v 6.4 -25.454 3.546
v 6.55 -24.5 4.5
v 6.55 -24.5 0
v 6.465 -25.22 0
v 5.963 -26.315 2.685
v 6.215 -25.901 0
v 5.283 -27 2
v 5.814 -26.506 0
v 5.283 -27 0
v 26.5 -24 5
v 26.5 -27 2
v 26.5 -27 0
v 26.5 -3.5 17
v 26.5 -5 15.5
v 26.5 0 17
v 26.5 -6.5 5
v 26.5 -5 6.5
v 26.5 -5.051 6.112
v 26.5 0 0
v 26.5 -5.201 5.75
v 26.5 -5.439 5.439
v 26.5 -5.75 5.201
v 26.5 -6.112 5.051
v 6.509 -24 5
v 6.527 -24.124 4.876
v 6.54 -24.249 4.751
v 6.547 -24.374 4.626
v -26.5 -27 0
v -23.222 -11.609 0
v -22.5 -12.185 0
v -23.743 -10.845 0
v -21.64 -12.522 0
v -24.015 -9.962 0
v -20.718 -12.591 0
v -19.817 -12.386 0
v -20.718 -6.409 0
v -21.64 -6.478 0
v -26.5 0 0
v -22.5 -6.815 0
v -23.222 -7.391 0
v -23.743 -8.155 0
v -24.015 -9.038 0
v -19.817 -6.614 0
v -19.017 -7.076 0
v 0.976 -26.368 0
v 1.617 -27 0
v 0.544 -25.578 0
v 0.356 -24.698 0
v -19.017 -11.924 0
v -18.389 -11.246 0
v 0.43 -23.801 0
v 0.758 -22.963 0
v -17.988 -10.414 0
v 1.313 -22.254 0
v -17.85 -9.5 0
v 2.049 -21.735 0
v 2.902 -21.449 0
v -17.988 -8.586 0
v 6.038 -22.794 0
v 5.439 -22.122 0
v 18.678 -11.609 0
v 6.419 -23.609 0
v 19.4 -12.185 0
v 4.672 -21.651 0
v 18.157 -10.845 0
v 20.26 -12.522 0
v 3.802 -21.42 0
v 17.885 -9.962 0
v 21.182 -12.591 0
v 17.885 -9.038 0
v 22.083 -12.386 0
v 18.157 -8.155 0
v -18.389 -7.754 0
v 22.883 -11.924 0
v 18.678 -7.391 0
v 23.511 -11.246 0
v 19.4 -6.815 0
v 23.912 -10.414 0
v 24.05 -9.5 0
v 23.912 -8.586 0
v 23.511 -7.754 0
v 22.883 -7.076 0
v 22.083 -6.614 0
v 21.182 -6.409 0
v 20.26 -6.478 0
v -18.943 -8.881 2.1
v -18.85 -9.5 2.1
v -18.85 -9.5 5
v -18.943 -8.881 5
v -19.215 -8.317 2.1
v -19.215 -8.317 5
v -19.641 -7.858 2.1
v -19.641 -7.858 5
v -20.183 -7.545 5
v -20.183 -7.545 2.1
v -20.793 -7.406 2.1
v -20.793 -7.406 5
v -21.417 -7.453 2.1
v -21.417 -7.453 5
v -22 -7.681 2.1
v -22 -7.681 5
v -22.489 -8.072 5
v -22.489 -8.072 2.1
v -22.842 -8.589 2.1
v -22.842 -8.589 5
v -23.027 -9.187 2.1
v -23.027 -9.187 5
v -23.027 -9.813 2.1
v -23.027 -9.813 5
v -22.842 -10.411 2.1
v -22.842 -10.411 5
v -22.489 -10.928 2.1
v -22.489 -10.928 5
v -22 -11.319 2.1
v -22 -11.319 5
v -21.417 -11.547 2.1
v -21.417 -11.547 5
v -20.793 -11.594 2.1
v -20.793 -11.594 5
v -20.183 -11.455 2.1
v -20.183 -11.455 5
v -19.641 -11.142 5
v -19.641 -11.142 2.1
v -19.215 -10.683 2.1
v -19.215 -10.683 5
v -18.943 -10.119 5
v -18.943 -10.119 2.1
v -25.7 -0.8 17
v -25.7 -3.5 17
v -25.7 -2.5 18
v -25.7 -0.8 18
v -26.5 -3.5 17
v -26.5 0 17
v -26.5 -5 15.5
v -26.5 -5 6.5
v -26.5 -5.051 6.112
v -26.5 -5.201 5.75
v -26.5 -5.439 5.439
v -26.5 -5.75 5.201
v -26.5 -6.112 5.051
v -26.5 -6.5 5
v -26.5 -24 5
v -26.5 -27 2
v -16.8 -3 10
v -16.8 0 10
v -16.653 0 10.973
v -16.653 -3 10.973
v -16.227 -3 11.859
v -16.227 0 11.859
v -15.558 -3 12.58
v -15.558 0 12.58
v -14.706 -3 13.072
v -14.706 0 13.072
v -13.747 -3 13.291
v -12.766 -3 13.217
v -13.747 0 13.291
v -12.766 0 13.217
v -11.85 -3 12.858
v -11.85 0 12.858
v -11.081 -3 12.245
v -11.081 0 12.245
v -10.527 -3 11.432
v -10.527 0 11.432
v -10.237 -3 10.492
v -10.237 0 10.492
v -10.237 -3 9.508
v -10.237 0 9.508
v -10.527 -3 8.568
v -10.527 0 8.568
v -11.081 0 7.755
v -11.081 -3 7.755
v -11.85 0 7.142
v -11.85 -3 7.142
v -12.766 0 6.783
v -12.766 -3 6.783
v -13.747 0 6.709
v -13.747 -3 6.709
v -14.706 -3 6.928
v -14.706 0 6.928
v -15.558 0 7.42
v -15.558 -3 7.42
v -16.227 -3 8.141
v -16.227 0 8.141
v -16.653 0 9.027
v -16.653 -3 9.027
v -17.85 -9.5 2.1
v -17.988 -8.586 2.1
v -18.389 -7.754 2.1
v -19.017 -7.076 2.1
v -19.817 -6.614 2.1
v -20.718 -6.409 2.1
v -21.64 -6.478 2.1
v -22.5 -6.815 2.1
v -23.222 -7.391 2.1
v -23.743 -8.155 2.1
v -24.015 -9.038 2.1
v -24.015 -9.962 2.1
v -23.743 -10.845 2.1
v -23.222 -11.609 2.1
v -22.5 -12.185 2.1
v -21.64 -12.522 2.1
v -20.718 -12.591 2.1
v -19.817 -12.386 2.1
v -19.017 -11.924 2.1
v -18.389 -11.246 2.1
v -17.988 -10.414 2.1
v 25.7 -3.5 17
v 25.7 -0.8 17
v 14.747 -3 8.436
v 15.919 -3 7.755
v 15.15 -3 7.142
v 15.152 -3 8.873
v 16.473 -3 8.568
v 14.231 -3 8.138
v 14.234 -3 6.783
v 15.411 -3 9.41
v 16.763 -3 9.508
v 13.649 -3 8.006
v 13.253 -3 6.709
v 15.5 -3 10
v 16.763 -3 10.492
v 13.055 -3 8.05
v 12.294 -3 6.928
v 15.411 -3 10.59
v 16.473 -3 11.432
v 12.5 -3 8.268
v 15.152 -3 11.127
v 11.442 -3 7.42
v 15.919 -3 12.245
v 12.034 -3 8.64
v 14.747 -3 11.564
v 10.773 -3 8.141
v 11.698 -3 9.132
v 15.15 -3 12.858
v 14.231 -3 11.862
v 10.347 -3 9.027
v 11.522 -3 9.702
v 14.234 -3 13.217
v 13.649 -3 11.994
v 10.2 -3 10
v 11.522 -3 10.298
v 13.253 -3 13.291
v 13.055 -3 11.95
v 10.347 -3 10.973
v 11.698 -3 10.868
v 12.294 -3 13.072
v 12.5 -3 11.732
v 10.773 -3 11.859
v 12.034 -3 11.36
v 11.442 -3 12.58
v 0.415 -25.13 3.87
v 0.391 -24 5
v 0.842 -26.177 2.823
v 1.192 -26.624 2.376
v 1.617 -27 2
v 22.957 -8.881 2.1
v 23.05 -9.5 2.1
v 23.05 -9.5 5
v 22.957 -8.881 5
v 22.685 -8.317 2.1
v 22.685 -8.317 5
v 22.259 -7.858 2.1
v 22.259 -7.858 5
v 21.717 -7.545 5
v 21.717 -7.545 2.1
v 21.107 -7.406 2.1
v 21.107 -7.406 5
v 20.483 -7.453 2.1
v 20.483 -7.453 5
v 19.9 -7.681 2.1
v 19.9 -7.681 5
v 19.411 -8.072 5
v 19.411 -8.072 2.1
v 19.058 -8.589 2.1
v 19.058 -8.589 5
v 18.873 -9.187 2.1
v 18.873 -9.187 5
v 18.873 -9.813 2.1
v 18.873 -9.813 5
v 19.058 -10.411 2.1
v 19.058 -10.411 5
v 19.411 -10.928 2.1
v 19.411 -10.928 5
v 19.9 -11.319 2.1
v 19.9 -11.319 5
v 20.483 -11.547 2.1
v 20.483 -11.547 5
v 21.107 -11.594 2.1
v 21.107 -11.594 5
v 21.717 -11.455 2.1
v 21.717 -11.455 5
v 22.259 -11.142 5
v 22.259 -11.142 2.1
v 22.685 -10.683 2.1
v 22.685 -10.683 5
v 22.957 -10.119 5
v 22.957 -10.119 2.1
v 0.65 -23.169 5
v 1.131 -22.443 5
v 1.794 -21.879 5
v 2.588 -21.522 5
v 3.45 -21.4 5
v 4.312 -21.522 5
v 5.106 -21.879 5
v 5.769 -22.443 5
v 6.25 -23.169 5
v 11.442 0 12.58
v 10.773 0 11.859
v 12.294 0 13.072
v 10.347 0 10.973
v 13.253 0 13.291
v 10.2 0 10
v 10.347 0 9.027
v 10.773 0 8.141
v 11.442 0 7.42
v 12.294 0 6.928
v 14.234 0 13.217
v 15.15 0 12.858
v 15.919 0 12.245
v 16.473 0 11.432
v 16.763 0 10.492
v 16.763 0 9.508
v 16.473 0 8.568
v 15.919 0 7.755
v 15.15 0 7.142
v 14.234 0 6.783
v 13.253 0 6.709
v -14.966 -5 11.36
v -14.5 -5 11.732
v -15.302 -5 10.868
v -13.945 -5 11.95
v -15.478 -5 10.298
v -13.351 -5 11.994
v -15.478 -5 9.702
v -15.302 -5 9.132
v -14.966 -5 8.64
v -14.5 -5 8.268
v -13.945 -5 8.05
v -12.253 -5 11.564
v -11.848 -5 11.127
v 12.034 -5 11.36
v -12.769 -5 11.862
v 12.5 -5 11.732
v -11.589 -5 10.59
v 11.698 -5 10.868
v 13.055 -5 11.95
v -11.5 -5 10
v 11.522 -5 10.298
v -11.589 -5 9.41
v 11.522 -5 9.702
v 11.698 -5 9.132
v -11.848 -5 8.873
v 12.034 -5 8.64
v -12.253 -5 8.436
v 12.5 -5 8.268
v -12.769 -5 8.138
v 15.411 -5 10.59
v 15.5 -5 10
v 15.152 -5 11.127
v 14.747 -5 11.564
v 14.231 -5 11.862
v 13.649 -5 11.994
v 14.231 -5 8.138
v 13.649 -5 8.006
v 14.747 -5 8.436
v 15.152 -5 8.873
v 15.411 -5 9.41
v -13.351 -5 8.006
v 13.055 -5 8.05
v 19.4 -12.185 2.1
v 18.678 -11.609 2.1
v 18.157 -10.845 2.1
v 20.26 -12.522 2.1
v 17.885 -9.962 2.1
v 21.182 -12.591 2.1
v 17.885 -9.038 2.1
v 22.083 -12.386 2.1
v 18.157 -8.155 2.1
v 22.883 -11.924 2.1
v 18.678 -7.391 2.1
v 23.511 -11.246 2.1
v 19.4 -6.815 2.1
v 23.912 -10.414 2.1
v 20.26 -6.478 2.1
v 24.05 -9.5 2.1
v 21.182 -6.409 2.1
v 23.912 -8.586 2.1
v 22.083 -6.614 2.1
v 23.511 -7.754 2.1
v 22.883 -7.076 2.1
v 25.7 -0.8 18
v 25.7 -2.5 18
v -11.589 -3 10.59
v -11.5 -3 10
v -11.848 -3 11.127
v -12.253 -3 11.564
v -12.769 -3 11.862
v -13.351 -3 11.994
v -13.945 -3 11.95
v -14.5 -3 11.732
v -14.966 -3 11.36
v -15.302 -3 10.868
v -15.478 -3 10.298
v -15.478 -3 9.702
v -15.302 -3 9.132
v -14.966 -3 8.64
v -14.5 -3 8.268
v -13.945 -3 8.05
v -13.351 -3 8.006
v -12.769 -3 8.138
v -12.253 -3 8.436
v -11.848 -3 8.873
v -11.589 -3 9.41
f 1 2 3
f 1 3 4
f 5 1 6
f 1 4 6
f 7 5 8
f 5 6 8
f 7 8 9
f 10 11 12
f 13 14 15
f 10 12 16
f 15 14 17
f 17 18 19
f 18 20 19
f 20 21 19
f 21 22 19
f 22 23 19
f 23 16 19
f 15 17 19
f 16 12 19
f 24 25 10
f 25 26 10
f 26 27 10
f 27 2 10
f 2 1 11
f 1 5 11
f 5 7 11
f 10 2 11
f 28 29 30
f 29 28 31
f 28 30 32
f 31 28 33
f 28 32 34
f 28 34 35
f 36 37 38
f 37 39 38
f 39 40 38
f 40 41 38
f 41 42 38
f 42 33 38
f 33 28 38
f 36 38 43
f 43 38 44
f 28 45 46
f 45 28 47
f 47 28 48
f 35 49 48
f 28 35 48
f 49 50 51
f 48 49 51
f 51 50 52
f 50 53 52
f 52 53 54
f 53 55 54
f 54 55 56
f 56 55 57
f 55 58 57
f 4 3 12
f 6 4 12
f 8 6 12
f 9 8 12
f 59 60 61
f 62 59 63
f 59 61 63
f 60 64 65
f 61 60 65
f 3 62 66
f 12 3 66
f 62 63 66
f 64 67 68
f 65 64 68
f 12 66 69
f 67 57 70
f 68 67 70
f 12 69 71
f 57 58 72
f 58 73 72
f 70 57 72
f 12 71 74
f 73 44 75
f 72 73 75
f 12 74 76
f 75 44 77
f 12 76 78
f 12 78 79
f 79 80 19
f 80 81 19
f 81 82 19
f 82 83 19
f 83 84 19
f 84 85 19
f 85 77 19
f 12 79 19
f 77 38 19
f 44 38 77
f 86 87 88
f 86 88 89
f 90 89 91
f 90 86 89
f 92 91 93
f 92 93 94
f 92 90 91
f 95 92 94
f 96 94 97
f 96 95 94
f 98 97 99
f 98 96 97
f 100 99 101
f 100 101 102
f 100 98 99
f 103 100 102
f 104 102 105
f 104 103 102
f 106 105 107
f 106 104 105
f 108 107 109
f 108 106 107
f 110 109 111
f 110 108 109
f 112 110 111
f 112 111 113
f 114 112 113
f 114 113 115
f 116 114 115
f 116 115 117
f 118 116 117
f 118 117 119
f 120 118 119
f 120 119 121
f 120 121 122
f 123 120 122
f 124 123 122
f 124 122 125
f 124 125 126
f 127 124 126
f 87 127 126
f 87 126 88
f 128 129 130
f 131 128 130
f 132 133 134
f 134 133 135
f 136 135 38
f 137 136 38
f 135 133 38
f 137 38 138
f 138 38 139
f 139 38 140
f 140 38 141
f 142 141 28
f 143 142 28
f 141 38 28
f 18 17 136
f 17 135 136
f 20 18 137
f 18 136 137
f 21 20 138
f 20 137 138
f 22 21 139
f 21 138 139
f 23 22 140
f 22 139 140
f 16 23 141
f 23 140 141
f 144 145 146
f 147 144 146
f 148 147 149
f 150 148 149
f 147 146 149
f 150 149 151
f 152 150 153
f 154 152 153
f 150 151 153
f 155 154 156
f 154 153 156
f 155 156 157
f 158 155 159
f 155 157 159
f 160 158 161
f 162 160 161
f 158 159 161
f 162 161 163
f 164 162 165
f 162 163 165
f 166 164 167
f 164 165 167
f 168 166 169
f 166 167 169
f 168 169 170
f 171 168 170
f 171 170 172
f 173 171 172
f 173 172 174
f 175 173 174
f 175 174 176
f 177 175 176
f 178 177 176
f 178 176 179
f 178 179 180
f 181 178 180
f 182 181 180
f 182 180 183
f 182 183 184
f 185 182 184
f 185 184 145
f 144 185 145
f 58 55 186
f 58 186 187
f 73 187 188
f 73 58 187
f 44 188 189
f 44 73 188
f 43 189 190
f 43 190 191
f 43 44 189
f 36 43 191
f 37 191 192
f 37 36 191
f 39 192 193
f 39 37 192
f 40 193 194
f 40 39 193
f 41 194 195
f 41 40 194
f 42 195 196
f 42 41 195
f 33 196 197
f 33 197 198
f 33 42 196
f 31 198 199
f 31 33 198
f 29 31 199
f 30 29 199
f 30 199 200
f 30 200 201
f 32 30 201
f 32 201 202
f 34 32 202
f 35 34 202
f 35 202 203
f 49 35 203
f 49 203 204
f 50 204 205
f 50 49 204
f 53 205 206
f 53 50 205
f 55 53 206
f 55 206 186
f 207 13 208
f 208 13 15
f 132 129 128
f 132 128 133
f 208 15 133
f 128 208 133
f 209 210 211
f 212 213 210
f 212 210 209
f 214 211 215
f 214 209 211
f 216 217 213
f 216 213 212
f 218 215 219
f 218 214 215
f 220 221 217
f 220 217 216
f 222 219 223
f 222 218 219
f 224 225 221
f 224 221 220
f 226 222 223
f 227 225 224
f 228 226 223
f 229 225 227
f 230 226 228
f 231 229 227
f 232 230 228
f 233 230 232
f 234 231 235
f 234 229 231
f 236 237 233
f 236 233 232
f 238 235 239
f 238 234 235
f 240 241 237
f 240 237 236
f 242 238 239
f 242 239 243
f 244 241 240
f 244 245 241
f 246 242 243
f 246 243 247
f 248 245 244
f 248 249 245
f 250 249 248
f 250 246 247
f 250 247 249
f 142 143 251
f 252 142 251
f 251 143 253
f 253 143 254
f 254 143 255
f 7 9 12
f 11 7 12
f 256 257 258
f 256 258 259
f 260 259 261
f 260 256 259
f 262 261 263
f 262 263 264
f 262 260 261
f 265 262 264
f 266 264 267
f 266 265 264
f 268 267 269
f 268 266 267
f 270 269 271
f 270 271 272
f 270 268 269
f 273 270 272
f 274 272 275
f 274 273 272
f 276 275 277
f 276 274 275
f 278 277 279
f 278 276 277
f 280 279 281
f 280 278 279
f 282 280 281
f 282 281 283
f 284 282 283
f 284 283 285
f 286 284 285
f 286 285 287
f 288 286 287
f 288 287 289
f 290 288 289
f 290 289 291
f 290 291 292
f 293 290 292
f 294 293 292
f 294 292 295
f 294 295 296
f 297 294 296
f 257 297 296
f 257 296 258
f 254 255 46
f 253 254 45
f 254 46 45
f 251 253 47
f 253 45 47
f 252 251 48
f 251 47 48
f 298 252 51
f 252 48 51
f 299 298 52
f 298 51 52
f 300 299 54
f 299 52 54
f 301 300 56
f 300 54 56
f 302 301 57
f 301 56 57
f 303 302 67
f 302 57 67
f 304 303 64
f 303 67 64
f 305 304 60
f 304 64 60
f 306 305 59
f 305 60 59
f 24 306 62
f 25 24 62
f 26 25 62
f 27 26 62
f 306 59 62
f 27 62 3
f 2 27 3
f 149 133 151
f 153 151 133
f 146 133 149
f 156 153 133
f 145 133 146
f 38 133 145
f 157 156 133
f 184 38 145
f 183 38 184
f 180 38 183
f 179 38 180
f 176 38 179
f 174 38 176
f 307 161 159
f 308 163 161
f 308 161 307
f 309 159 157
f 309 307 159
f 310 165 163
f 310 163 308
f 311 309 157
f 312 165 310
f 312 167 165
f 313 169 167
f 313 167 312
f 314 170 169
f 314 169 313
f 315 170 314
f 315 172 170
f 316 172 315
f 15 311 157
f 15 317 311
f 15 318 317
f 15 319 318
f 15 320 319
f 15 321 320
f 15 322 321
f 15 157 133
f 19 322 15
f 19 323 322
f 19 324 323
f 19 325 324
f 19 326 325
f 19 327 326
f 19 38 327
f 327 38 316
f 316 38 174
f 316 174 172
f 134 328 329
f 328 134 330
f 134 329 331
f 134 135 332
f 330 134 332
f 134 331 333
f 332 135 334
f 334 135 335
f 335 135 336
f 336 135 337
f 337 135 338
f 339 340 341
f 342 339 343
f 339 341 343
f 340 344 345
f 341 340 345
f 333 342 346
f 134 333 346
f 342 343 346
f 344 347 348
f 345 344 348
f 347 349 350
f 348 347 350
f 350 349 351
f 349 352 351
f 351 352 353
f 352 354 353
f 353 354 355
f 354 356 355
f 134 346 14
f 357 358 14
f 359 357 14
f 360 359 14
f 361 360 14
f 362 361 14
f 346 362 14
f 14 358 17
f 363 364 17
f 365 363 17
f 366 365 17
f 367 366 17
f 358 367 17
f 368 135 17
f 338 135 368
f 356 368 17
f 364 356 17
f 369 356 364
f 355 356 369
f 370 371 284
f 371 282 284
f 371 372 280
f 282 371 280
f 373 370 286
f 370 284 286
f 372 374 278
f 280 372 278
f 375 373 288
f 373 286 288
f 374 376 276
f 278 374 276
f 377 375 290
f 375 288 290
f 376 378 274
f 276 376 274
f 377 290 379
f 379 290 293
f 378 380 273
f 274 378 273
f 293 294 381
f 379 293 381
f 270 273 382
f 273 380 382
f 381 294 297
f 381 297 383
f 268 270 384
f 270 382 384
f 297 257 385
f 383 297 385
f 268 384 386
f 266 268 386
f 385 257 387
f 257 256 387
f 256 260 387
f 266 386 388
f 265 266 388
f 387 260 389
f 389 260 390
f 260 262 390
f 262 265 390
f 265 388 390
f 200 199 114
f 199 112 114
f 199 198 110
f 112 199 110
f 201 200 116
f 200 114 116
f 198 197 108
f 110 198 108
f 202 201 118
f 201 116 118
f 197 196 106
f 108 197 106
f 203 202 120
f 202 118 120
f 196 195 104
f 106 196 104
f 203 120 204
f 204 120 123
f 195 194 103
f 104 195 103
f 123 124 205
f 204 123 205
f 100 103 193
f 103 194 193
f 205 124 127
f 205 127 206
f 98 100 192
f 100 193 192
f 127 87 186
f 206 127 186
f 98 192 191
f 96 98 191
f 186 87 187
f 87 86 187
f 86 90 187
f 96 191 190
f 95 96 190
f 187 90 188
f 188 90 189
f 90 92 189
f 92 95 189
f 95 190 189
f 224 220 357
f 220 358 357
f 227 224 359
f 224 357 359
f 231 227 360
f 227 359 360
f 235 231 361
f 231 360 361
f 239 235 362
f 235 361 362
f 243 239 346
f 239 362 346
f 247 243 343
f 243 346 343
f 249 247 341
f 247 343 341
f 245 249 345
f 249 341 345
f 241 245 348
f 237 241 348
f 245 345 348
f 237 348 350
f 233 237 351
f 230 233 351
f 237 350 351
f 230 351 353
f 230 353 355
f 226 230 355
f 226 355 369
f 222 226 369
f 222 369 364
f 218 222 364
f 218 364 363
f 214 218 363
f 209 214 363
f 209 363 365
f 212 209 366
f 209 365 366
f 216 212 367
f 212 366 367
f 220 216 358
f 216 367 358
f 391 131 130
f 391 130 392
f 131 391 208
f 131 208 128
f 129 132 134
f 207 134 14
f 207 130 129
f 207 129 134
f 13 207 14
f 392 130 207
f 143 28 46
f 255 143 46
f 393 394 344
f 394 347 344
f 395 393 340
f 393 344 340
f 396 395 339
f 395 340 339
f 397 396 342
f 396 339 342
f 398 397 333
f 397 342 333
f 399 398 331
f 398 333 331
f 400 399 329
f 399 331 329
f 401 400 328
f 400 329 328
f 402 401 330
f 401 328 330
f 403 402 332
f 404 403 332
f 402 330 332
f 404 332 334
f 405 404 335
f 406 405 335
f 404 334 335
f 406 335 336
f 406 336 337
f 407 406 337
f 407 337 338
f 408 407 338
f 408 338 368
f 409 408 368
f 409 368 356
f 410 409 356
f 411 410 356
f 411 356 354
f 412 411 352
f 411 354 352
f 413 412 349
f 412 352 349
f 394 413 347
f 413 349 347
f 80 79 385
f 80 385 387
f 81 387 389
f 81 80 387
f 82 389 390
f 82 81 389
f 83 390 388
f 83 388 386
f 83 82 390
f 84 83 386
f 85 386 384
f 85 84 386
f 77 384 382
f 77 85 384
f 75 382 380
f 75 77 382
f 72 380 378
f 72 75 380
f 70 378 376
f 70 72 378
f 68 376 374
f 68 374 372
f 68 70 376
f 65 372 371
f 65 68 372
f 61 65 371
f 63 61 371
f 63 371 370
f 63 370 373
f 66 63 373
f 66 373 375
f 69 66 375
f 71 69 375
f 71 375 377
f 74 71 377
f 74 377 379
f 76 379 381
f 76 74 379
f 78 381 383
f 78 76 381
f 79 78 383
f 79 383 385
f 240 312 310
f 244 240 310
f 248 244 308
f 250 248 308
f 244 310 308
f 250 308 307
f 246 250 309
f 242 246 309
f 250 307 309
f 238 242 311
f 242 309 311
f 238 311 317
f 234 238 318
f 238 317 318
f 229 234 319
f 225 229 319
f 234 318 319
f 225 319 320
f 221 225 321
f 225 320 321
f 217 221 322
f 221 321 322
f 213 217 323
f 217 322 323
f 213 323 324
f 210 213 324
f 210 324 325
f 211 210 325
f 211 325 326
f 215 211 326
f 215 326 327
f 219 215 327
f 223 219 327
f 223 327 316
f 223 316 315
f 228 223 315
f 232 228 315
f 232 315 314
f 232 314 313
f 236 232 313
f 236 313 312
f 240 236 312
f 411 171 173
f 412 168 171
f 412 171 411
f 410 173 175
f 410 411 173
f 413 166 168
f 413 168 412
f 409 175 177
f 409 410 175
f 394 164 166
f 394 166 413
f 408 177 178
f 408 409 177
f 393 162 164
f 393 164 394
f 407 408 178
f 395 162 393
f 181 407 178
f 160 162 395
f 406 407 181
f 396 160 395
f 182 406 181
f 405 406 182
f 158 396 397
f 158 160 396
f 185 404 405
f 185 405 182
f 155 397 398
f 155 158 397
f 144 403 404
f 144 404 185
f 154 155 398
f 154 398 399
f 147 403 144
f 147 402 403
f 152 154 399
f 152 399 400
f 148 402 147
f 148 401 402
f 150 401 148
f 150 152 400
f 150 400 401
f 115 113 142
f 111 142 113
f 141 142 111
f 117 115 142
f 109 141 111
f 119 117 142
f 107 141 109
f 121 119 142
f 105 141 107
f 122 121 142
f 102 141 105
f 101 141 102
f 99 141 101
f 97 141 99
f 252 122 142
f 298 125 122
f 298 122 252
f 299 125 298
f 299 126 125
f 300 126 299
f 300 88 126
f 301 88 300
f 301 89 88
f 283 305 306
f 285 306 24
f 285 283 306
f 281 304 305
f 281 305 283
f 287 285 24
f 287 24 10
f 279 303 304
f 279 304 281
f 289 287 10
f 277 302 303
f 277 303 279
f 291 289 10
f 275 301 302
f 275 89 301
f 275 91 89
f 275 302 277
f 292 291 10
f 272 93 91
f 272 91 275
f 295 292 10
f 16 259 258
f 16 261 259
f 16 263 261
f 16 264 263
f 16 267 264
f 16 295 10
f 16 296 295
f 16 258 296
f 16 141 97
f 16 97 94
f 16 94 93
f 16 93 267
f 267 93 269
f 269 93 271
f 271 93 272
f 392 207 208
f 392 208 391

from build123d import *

# Parameters (mm, degrees)
F0_R           = 3.1
F0_W           = 53
F0_H           = 5
F0_R_2         = 2.1
F1_DEPTH       = 5
F2_DEPTH       = 2.1
F3_DEPTH       = 18
F4_W           = 0.8
F4_H           = 1
F4_W_2         = 51.4
F5_DEPTH       = 0.8
F6_DEPTH       = 25
F7_D           = 4
F7_CBORE_D     = 6.6
F7_CBORE_DEPTH = 3
F8_SIZE        = 2.5
F9_R           = 1.5
F10_SIZE       = 3


with BuildPart() as f1:
    # F0 (on Top) → F1 (new body)
    with BuildSketch(Plane.XY):
        with BuildLine():
            Line((26.5, -5), (-26.5, -5))
            Line((-26.5, -5), (-26.5, -27))
            Line((-26.5, -27), (1.616969722, -27))
            ThreePointArc((1.616969722, -27), (2.0486424192, -21.7348242496), (6.55, -24.5))
            ThreePointArc((6.55, -24.5), (6.2151757504, -25.9013575808), (5.283030278, -27))
            Line((5.283030278, -27), (26.5, -27))
            Line((26.5, -27), (26.5, -5))
        make_face()
        with Locations((-20.95, -9.5)):
            Circle(F0_R, mode=Mode.SUBTRACT)
        with Locations((20.95, -9.5)):
            Circle(F0_R, mode=Mode.SUBTRACT)
        with Locations((0, -2.5)):
            Rectangle(F0_W, F0_H)
        with Locations((-20.95, -9.5)):
            Circle(F0_R)
        with Locations((-20.95, -9.5)):
            Circle(F0_R_2, mode=Mode.SUBTRACT)
        with Locations((20.95, -9.5)):
            Circle(F0_R)
        with Locations((20.95, -9.5)):
            Circle(F0_R_2, mode=Mode.SUBTRACT)
    extrude(amount=F1_DEPTH)

    # F0 (on Top) → F2 (cut)
    with BuildSketch(Plane.XY):
        with Locations((20.95, -9.5)):
            Circle(F0_R)
        with Locations((20.95, -9.5)):
            Circle(F0_R_2, mode=Mode.SUBTRACT)
        with Locations((-20.95, -9.5)):
            Circle(F0_R)
        with Locations((-20.95, -9.5)):
            Circle(F0_R_2, mode=Mode.SUBTRACT)
    extrude(amount=F2_DEPTH, mode=Mode.SUBTRACT)

    # F0 (on Top) → F3 (join)
    with BuildSketch(Plane.XY):
        with Locations((0, -2.5)):
            Rectangle(F0_W, F0_H)
    extrude(amount=F3_DEPTH)

    # F4 (on face) → F5 (cut)
    with BuildSketch(Plane(origin=(0, 0, 0), x_dir=(-1, 0, 0), z_dir=(0, 1, 0))):
        with Locations((-26.1, 17.5)):
            Rectangle(F4_W, F4_H)
        with Locations((0, 17.5)):
            Rectangle(F4_W_2, F4_H)
        with Locations((26.1, 17.5)):
            Rectangle(F4_W, F4_H)
    extrude(amount=-F5_DEPTH, mode=Mode.SUBTRACT)

    # F4 (on face) → F6 (cut)
    with BuildSketch(Plane(origin=(0, 0, 0), x_dir=(-1, 0, 0), z_dir=(0, 1, 0))):
        with Locations((-26.1, 17.5)):
            Rectangle(F4_W, F4_H)
        with Locations((26.1, 17.5)):
            Rectangle(F4_W, F4_H)
    extrude(amount=-F6_DEPTH, mode=Mode.SUBTRACT)

    # F7 (through all)
    with Locations(Plane(origin=(0, 0, 0), x_dir=(-1, 0, 0), z_dir=(0, 1, 0))):
        with Locations((13.5, 10), (-13.5, 10)):
            CounterBoreHole(F7_D / 2, F7_CBORE_D / 2, F7_CBORE_DEPTH)

    # F8
    f8_edges = [f1.edges().sort_by_distance(p)[0] for p in [
        (0, -5, 18),
    ]]
    chamfer(f8_edges, length=F8_SIZE)

    # F9
    f9_edges = [f1.edges().sort_by_distance(p)[0] for p in [
        (0, -5, 5),
    ]]
    fillet(f9_edges, radius=F9_R)

    # F10
    f10_edges = [f1.edges().sort_by_distance(p)[0] for p in [
        (15.891515, -27, 5),
        (-12.441515, -27, 5),
    ]]
    chamfer(f10_edges, length=F10_SIZE)


solid = f1.part
